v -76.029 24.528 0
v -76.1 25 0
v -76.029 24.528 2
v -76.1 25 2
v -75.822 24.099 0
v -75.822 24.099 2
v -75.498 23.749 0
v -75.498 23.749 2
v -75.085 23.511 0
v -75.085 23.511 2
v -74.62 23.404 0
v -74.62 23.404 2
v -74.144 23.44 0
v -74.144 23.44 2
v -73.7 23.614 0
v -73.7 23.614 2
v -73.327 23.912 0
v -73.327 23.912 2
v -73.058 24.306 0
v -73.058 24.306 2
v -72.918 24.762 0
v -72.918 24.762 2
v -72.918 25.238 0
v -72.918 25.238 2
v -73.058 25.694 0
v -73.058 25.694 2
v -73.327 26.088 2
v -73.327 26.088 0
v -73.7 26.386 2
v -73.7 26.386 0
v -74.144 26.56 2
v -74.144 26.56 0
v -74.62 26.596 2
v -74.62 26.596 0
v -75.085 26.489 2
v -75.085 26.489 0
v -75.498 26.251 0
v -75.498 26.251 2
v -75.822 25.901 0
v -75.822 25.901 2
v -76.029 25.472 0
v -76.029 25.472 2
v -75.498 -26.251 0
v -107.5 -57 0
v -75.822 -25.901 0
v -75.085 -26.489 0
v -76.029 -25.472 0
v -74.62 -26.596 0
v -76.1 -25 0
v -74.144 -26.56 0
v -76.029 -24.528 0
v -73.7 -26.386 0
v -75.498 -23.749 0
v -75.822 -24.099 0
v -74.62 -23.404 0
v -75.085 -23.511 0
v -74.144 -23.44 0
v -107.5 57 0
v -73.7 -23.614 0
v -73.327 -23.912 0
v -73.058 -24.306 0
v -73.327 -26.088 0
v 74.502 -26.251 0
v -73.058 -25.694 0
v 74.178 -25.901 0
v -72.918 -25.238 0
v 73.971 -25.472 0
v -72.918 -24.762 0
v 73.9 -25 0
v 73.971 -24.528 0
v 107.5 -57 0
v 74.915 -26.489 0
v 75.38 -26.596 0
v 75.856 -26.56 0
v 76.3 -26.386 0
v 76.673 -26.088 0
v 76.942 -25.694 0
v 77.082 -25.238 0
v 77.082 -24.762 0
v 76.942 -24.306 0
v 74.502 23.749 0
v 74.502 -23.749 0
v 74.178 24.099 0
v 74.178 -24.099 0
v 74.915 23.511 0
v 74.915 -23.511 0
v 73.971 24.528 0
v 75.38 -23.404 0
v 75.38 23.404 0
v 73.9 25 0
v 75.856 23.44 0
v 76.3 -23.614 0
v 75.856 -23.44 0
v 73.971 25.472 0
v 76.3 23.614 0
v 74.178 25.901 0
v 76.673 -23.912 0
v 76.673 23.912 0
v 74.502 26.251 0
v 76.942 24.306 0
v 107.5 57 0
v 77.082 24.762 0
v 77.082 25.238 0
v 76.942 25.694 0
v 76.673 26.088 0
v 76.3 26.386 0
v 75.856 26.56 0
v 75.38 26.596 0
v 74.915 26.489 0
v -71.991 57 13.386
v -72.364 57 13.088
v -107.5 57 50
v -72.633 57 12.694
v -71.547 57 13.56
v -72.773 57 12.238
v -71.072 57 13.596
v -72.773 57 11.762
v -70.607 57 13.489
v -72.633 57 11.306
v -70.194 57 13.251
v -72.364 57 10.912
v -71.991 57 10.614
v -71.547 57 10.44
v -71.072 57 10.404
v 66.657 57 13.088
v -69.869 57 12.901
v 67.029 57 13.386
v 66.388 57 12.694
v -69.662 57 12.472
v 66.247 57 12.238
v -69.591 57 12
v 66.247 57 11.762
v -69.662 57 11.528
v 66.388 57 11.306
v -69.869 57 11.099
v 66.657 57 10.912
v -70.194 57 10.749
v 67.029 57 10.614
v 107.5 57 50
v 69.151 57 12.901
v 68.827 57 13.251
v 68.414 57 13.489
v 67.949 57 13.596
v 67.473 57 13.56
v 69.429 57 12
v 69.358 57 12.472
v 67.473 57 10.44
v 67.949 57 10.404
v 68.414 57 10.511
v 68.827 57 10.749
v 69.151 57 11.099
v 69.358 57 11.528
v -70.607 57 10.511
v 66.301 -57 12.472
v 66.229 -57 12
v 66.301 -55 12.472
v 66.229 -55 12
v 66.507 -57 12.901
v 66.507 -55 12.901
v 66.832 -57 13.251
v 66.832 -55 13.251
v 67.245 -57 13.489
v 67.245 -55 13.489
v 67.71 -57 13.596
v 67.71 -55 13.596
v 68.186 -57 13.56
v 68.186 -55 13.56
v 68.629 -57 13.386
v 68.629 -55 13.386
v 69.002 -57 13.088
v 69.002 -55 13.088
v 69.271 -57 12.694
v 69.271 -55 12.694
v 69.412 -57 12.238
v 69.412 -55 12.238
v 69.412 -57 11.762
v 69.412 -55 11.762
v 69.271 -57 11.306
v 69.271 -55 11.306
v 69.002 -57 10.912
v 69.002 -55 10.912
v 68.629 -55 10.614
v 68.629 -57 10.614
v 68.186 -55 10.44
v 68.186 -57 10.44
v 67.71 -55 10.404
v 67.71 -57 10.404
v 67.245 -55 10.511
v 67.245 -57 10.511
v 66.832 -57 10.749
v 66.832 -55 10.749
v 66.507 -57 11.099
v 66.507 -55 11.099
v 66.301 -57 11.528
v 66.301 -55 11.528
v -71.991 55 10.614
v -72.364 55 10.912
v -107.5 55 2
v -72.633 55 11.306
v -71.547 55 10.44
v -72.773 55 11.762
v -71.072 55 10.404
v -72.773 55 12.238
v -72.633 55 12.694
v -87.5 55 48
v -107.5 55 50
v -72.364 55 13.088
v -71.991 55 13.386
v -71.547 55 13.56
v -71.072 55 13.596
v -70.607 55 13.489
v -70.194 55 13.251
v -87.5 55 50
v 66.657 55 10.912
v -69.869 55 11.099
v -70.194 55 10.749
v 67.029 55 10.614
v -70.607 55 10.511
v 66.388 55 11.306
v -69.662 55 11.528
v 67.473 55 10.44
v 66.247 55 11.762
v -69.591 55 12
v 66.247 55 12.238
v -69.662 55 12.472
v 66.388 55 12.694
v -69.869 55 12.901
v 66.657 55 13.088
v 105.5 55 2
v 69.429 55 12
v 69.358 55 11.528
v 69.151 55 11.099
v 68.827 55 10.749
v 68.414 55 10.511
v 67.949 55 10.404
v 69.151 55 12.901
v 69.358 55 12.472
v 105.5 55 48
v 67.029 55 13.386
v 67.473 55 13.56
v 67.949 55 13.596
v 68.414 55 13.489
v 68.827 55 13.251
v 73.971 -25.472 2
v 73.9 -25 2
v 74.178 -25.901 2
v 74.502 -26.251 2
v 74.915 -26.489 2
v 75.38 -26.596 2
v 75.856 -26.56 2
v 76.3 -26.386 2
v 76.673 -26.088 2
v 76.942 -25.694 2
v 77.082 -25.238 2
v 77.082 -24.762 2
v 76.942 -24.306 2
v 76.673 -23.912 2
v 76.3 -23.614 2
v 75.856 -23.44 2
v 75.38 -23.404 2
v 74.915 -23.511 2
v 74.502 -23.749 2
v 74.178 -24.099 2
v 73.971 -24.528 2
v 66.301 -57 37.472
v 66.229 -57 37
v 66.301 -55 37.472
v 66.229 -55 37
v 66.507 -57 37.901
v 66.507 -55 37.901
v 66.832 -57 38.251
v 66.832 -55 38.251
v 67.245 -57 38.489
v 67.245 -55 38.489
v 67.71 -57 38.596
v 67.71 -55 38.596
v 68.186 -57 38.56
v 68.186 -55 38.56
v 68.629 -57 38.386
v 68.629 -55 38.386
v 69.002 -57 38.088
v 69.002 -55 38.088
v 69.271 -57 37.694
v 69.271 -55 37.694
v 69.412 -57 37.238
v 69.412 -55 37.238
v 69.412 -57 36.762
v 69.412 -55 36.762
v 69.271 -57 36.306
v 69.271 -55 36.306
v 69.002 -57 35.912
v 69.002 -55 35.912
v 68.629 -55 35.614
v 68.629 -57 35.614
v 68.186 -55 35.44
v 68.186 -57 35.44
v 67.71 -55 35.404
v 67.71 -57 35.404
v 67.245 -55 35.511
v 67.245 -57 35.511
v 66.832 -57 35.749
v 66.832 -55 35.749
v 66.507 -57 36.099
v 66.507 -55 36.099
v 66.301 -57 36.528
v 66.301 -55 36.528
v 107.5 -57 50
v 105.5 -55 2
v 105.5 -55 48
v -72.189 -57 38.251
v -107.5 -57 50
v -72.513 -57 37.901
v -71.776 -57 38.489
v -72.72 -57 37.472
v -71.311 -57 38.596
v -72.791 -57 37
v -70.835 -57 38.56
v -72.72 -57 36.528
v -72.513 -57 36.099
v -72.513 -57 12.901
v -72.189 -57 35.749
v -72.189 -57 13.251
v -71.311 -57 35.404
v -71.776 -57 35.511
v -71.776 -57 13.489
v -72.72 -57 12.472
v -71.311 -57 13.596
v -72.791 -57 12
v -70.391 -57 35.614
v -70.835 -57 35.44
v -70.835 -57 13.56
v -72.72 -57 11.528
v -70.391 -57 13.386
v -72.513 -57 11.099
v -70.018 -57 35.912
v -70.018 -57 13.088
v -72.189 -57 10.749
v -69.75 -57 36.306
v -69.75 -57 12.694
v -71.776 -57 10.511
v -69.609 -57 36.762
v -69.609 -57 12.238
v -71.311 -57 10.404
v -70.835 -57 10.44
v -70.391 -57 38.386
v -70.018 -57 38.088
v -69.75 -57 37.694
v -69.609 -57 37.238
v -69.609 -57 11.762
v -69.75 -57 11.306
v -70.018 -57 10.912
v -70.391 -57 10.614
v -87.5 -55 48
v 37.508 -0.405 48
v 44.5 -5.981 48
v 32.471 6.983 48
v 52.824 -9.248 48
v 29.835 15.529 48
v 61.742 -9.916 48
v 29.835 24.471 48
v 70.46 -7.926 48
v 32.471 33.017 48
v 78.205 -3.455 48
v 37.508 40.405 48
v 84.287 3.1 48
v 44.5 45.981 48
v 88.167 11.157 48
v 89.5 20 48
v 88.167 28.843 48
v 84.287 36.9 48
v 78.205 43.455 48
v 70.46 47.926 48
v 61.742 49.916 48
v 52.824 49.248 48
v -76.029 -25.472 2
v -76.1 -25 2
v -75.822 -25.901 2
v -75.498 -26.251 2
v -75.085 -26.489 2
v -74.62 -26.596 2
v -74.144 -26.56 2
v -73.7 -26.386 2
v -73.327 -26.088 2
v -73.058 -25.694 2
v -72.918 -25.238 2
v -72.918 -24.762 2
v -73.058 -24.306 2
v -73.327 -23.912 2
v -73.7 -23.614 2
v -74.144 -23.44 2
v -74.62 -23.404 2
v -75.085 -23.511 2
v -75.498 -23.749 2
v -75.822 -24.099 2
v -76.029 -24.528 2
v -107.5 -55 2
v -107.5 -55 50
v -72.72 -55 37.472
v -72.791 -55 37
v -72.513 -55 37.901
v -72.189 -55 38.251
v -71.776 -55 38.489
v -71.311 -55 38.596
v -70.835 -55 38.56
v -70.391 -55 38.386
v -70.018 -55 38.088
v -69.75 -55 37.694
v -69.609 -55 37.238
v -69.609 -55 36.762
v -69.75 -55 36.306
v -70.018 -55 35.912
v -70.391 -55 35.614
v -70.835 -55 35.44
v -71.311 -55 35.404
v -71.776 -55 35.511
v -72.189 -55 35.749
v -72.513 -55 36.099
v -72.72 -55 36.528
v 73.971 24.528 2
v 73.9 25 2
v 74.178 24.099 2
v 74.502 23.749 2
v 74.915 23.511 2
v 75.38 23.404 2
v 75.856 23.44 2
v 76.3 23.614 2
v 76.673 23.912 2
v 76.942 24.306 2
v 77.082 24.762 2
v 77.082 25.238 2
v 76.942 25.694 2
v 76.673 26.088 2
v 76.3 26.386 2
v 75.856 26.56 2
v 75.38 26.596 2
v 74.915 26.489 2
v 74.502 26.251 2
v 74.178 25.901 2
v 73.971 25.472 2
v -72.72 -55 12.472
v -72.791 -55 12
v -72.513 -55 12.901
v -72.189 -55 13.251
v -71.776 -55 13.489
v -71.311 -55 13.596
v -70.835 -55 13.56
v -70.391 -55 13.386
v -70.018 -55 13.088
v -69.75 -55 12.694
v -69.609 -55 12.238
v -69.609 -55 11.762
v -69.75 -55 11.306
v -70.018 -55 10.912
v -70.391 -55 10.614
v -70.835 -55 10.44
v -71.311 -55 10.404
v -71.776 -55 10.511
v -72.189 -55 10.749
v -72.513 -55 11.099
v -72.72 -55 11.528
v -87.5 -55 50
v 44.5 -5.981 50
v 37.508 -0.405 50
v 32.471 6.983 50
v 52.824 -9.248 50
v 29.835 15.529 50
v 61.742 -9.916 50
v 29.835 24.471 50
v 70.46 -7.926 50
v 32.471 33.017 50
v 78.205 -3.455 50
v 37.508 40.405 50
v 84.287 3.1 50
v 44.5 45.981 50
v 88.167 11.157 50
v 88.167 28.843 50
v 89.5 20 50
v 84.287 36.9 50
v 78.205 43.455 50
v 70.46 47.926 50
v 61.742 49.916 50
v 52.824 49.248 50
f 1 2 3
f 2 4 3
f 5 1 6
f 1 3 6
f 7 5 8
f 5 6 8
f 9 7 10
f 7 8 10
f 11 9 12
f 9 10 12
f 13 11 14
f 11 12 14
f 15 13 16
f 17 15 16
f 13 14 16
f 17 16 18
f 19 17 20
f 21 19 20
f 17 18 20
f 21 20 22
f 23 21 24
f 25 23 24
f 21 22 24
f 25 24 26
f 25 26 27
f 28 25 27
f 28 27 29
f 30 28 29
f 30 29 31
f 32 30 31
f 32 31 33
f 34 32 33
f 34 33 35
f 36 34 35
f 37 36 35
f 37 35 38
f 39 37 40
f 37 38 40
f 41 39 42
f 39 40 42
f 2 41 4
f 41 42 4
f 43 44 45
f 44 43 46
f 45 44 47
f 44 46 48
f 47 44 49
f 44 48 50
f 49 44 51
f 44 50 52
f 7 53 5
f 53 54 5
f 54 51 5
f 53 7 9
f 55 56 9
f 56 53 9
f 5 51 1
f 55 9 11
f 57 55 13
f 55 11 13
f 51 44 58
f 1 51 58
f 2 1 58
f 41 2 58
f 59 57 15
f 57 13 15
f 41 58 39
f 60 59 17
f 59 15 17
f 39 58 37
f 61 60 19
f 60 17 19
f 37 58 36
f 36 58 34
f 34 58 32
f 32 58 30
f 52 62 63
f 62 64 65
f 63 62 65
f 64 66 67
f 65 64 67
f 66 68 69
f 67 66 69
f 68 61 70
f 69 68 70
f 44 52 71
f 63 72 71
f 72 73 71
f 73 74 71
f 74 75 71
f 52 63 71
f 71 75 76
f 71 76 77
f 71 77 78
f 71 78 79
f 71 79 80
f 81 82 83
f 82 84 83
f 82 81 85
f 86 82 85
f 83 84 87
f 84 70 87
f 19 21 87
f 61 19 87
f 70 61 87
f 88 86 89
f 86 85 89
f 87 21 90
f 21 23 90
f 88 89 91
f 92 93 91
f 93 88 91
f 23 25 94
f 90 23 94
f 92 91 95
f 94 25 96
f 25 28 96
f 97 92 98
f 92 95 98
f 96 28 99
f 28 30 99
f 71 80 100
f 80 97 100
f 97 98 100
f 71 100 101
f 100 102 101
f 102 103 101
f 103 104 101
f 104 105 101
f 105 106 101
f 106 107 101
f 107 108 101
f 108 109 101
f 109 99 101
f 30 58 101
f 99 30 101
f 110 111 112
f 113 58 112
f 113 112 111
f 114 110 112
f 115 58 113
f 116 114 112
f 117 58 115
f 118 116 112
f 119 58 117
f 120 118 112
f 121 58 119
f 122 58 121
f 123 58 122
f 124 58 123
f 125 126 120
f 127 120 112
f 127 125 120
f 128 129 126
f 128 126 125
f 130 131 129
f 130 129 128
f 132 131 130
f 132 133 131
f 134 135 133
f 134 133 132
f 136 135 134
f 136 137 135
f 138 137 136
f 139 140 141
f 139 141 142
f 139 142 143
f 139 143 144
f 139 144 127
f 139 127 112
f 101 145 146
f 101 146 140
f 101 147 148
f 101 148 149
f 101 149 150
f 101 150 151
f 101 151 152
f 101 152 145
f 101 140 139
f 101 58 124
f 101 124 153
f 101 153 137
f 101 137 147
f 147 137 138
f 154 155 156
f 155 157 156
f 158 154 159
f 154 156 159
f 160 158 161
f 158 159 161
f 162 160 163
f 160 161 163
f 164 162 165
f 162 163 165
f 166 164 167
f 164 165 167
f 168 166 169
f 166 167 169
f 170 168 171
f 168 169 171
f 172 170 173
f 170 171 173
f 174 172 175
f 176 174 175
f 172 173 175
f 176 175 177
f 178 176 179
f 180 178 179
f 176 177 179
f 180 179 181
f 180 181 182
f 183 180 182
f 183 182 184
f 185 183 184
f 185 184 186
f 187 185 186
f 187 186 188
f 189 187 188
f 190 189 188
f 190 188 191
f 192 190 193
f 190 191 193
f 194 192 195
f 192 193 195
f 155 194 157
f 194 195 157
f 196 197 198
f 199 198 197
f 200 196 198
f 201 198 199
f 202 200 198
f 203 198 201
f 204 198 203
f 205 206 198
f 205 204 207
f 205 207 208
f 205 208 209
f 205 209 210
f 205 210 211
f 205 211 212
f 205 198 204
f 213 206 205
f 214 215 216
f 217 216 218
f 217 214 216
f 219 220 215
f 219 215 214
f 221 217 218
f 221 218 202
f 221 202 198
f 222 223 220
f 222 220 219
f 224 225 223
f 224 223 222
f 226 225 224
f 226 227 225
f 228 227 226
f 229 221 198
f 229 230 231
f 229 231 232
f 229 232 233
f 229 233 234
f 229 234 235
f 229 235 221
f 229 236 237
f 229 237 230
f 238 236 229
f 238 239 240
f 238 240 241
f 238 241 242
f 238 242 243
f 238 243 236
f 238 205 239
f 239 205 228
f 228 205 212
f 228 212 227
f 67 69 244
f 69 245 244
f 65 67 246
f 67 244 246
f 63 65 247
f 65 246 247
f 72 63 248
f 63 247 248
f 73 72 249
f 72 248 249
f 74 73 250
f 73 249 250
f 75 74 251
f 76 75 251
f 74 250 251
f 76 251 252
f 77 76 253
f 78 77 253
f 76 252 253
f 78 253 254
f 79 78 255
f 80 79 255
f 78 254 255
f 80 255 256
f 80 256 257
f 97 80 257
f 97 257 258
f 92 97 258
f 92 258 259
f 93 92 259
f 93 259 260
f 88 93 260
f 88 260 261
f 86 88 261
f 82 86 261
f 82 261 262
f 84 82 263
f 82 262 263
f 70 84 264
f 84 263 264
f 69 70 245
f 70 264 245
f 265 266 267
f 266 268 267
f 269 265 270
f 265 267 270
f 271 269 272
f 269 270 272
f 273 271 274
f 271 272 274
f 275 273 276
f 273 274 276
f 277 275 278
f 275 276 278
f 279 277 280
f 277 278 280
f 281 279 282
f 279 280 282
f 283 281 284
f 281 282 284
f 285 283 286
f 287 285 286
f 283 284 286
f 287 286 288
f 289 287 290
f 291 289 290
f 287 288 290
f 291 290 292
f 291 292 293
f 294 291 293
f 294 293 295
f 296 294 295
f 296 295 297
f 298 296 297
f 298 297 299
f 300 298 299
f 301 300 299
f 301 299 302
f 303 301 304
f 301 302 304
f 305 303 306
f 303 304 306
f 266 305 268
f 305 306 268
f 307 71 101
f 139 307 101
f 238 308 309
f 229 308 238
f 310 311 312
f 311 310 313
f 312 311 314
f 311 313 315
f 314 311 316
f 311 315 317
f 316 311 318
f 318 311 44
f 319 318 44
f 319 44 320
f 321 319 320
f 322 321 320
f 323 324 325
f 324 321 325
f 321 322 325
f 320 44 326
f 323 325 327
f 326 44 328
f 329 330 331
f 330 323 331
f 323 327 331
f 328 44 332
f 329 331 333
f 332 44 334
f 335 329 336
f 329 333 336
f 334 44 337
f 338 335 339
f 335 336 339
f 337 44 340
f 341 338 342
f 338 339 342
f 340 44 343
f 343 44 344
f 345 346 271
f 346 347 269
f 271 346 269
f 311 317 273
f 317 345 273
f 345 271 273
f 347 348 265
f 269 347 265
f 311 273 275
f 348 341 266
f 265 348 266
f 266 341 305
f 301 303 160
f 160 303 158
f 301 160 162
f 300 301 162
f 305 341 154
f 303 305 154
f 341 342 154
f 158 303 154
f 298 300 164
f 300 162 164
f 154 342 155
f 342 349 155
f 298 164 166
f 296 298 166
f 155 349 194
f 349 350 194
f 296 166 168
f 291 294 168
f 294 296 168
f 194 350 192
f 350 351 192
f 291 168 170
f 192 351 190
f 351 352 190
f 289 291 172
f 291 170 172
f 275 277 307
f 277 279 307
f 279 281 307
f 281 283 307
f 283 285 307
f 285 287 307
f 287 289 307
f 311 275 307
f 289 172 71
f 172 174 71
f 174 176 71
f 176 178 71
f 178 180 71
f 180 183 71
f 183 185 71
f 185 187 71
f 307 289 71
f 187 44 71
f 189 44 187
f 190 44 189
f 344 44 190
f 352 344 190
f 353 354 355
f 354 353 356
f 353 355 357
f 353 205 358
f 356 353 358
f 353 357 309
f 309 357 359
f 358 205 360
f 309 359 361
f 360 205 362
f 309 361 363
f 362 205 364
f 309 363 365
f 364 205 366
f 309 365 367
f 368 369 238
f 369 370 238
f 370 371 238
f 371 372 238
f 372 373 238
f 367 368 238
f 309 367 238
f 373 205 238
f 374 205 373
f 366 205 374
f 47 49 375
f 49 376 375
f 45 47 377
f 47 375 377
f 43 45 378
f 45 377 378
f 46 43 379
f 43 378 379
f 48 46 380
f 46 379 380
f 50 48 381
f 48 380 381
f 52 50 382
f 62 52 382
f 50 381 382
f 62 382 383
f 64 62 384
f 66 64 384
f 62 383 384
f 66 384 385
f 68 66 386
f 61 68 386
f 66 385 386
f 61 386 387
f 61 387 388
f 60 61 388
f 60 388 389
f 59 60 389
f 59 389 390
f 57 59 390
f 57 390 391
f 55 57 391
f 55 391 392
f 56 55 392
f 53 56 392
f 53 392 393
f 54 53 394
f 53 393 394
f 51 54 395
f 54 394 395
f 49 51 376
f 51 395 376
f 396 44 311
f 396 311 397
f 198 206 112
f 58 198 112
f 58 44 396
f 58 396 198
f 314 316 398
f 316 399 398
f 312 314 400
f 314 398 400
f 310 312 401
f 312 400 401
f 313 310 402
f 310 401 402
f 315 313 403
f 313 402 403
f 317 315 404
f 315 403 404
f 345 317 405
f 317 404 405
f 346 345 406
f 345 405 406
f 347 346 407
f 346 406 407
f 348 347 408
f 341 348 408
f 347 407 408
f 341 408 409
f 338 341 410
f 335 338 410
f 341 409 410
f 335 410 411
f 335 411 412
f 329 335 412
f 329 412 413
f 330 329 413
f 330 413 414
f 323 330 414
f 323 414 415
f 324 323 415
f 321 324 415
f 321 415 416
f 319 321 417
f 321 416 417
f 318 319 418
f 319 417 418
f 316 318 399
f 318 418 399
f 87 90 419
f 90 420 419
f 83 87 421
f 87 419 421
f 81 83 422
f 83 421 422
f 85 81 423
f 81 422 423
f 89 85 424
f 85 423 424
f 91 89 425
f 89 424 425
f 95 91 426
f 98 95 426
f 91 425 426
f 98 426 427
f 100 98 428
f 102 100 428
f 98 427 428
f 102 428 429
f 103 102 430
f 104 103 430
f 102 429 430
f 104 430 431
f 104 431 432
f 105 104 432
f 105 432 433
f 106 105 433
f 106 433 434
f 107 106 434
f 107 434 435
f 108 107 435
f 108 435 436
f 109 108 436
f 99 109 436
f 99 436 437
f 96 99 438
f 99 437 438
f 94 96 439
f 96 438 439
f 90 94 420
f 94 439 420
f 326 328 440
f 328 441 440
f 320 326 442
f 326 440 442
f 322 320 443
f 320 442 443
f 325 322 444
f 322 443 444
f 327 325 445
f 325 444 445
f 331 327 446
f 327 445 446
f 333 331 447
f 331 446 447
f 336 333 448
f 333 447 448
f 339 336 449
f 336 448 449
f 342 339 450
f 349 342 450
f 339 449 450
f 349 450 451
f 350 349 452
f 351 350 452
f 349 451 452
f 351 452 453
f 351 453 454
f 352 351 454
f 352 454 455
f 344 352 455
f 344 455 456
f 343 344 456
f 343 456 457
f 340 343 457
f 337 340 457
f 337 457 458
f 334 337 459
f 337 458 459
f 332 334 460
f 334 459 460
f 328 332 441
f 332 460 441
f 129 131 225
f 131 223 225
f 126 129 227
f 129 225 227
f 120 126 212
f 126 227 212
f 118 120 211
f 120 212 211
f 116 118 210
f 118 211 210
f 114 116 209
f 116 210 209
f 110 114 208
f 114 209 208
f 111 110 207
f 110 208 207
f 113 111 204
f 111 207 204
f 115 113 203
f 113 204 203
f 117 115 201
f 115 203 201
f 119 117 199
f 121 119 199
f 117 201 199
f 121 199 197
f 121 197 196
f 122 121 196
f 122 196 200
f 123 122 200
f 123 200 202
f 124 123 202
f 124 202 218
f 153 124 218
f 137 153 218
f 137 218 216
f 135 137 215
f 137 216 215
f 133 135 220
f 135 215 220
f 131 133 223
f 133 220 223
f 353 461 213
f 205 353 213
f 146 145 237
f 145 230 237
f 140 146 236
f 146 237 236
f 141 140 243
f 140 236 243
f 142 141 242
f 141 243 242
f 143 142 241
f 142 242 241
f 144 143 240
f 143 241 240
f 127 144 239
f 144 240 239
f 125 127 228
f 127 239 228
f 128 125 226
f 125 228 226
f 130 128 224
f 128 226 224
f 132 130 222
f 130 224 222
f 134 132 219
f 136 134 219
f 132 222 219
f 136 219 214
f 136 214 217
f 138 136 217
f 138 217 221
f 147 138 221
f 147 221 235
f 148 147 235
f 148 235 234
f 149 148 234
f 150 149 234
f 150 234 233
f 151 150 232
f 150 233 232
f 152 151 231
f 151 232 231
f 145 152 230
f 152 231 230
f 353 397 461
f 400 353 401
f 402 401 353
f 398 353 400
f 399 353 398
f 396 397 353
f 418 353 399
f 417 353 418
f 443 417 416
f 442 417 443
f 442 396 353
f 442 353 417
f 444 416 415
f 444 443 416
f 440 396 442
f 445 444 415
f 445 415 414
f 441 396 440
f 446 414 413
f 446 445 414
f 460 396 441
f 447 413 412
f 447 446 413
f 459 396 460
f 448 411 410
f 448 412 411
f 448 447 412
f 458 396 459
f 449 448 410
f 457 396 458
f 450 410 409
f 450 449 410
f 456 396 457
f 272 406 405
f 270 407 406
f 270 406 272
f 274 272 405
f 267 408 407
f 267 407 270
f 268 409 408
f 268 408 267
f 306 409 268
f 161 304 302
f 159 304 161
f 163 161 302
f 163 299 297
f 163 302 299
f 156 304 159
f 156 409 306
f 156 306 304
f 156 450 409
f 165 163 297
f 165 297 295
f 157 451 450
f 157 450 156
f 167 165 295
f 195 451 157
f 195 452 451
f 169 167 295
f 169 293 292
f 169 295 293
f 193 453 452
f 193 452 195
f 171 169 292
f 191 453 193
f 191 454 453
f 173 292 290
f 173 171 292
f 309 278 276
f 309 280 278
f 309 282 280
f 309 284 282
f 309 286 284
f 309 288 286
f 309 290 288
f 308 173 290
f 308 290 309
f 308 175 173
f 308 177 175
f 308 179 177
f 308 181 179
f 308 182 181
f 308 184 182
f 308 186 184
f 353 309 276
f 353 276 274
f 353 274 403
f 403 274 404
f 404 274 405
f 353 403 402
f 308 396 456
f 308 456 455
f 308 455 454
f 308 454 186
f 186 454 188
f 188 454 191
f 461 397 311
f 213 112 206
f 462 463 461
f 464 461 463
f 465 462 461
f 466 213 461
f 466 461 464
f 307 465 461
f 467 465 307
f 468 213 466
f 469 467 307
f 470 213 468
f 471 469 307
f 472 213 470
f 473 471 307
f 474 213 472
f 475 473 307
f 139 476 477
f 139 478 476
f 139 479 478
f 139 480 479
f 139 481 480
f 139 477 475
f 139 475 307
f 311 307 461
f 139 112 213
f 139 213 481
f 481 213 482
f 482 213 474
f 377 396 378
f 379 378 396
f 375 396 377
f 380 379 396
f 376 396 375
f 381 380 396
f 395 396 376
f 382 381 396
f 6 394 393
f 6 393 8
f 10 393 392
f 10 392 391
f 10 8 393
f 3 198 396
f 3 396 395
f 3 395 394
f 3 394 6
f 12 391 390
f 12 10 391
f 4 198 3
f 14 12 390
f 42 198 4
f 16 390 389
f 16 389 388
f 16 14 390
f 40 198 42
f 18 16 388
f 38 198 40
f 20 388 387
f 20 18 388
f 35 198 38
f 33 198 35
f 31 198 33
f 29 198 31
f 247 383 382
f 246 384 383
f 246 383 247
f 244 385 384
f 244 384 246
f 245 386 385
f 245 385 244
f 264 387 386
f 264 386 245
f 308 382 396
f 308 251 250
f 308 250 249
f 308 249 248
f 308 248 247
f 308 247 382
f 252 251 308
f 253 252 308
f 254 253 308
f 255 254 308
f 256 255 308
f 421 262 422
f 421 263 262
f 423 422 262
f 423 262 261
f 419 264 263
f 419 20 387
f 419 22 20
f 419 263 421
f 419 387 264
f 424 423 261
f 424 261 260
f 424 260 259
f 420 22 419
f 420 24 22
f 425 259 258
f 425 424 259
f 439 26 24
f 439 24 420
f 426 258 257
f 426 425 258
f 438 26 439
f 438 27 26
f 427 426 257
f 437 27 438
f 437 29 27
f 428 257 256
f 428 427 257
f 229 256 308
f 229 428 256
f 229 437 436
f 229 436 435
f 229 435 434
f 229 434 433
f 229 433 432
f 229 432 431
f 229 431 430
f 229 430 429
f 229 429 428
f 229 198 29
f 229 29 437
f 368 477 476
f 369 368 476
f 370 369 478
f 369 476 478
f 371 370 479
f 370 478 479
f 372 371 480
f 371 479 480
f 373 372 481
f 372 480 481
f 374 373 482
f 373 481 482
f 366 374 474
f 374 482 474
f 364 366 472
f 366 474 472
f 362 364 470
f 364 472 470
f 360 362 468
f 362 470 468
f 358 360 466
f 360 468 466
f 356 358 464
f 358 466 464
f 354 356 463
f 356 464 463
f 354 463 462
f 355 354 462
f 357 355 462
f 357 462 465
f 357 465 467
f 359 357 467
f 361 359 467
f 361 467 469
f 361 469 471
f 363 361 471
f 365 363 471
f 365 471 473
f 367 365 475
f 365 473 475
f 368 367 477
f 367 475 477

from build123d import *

# Parameters (mm, degrees)
F0_W           = 215
F0_H           = 114
F1_DEPTH       = 50
F2_T           = -2
F3_W           = 20
F3_H           = 110
F3_R           = 30
F4_DEPTH       = 2
F8_D           = 3.2
F8_DEPTH       = 2
F8_TIP         = 0.9613769904
F8_ON_F5_D     = 3.2
F8_ON_F5_DEPTH = 2
F8_ON_F5_TIP   = 0.9613769904
F8_ON_F6_D     = 3.2
F8_ON_F6_DEPTH = 2
F8_ON_F6_TIP   = 0.9613769904


with BuildPart() as f1:
    # F0 (on Top) → F1 (new body)
    with BuildSketch(Plane.XY):
        Rectangle(F0_W, F0_H)
    extrude(amount=F1_DEPTH)

    # F2
    f2_openings = [f1.faces().sort_by_distance(p)[0] for p in [
        (-107.5, 0, 25),
    ]]
    offset(amount=F2_T, openings=f2_openings)

    # F3 (on face) → F4 (cut, through all)
    with BuildSketch(Plane.XY.offset(50)):
        with Locations((-97.5, 0)):
            Rectangle(F3_W, F3_H)
        with Locations((59.5, 20)):
            Circle(F3_R)
    extrude(amount=-F4_DEPTH, mode=Mode.SUBTRACT)

    # F8
    with Locations(Plane(origin=(0, 0, 0), x_dir=(1, 0, 0), z_dir=(0, 0, -1))):
        with Locations((-74.5, 25), (-74.5, -25), (75.5, -25), (75.5, 25)):
            Hole(F8_D / 2, depth=F8_DEPTH)
            with Locations((0, 0, -(F8_DEPTH + F8_TIP / 2))):  # 118° drill point
                Cone(0, F8_D / 2, F8_TIP, mode=Mode.SUBTRACT)

    # F8 on F5
    with Locations(Plane.XZ.offset(57)):
        with Locations((-71.1912775098, 37), (-71.1912775098, 12), (67.8294761911, 37), (67.8294761911, 12)):
            Hole(F8_ON_F5_D / 2, depth=F8_ON_F5_DEPTH)
            with Locations((0, 0, -(F8_ON_F5_DEPTH + F8_ON_F5_TIP / 2))):  # 118° drill point
                Cone(0, F8_ON_F5_D / 2, F8_ON_F5_TIP, mode=Mode.SUBTRACT)

    # F8 on F6
    with Locations(Plane(origin=(0, 57, 0), x_dir=(-1, 0, 0), z_dir=(0, 1, 0))):
        with Locations((71.1912775098, 12), (-67.8294761911, 12)):
            Hole(F8_ON_F6_D / 2, depth=F8_ON_F6_DEPTH)
            with Locations((0, 0, -(F8_ON_F6_DEPTH + F8_ON_F6_TIP / 2))):  # 118° drill point
                Cone(0, F8_ON_F6_D / 2, F8_ON_F6_TIP, mode=Mode.SUBTRACT)


solid = f1.part
